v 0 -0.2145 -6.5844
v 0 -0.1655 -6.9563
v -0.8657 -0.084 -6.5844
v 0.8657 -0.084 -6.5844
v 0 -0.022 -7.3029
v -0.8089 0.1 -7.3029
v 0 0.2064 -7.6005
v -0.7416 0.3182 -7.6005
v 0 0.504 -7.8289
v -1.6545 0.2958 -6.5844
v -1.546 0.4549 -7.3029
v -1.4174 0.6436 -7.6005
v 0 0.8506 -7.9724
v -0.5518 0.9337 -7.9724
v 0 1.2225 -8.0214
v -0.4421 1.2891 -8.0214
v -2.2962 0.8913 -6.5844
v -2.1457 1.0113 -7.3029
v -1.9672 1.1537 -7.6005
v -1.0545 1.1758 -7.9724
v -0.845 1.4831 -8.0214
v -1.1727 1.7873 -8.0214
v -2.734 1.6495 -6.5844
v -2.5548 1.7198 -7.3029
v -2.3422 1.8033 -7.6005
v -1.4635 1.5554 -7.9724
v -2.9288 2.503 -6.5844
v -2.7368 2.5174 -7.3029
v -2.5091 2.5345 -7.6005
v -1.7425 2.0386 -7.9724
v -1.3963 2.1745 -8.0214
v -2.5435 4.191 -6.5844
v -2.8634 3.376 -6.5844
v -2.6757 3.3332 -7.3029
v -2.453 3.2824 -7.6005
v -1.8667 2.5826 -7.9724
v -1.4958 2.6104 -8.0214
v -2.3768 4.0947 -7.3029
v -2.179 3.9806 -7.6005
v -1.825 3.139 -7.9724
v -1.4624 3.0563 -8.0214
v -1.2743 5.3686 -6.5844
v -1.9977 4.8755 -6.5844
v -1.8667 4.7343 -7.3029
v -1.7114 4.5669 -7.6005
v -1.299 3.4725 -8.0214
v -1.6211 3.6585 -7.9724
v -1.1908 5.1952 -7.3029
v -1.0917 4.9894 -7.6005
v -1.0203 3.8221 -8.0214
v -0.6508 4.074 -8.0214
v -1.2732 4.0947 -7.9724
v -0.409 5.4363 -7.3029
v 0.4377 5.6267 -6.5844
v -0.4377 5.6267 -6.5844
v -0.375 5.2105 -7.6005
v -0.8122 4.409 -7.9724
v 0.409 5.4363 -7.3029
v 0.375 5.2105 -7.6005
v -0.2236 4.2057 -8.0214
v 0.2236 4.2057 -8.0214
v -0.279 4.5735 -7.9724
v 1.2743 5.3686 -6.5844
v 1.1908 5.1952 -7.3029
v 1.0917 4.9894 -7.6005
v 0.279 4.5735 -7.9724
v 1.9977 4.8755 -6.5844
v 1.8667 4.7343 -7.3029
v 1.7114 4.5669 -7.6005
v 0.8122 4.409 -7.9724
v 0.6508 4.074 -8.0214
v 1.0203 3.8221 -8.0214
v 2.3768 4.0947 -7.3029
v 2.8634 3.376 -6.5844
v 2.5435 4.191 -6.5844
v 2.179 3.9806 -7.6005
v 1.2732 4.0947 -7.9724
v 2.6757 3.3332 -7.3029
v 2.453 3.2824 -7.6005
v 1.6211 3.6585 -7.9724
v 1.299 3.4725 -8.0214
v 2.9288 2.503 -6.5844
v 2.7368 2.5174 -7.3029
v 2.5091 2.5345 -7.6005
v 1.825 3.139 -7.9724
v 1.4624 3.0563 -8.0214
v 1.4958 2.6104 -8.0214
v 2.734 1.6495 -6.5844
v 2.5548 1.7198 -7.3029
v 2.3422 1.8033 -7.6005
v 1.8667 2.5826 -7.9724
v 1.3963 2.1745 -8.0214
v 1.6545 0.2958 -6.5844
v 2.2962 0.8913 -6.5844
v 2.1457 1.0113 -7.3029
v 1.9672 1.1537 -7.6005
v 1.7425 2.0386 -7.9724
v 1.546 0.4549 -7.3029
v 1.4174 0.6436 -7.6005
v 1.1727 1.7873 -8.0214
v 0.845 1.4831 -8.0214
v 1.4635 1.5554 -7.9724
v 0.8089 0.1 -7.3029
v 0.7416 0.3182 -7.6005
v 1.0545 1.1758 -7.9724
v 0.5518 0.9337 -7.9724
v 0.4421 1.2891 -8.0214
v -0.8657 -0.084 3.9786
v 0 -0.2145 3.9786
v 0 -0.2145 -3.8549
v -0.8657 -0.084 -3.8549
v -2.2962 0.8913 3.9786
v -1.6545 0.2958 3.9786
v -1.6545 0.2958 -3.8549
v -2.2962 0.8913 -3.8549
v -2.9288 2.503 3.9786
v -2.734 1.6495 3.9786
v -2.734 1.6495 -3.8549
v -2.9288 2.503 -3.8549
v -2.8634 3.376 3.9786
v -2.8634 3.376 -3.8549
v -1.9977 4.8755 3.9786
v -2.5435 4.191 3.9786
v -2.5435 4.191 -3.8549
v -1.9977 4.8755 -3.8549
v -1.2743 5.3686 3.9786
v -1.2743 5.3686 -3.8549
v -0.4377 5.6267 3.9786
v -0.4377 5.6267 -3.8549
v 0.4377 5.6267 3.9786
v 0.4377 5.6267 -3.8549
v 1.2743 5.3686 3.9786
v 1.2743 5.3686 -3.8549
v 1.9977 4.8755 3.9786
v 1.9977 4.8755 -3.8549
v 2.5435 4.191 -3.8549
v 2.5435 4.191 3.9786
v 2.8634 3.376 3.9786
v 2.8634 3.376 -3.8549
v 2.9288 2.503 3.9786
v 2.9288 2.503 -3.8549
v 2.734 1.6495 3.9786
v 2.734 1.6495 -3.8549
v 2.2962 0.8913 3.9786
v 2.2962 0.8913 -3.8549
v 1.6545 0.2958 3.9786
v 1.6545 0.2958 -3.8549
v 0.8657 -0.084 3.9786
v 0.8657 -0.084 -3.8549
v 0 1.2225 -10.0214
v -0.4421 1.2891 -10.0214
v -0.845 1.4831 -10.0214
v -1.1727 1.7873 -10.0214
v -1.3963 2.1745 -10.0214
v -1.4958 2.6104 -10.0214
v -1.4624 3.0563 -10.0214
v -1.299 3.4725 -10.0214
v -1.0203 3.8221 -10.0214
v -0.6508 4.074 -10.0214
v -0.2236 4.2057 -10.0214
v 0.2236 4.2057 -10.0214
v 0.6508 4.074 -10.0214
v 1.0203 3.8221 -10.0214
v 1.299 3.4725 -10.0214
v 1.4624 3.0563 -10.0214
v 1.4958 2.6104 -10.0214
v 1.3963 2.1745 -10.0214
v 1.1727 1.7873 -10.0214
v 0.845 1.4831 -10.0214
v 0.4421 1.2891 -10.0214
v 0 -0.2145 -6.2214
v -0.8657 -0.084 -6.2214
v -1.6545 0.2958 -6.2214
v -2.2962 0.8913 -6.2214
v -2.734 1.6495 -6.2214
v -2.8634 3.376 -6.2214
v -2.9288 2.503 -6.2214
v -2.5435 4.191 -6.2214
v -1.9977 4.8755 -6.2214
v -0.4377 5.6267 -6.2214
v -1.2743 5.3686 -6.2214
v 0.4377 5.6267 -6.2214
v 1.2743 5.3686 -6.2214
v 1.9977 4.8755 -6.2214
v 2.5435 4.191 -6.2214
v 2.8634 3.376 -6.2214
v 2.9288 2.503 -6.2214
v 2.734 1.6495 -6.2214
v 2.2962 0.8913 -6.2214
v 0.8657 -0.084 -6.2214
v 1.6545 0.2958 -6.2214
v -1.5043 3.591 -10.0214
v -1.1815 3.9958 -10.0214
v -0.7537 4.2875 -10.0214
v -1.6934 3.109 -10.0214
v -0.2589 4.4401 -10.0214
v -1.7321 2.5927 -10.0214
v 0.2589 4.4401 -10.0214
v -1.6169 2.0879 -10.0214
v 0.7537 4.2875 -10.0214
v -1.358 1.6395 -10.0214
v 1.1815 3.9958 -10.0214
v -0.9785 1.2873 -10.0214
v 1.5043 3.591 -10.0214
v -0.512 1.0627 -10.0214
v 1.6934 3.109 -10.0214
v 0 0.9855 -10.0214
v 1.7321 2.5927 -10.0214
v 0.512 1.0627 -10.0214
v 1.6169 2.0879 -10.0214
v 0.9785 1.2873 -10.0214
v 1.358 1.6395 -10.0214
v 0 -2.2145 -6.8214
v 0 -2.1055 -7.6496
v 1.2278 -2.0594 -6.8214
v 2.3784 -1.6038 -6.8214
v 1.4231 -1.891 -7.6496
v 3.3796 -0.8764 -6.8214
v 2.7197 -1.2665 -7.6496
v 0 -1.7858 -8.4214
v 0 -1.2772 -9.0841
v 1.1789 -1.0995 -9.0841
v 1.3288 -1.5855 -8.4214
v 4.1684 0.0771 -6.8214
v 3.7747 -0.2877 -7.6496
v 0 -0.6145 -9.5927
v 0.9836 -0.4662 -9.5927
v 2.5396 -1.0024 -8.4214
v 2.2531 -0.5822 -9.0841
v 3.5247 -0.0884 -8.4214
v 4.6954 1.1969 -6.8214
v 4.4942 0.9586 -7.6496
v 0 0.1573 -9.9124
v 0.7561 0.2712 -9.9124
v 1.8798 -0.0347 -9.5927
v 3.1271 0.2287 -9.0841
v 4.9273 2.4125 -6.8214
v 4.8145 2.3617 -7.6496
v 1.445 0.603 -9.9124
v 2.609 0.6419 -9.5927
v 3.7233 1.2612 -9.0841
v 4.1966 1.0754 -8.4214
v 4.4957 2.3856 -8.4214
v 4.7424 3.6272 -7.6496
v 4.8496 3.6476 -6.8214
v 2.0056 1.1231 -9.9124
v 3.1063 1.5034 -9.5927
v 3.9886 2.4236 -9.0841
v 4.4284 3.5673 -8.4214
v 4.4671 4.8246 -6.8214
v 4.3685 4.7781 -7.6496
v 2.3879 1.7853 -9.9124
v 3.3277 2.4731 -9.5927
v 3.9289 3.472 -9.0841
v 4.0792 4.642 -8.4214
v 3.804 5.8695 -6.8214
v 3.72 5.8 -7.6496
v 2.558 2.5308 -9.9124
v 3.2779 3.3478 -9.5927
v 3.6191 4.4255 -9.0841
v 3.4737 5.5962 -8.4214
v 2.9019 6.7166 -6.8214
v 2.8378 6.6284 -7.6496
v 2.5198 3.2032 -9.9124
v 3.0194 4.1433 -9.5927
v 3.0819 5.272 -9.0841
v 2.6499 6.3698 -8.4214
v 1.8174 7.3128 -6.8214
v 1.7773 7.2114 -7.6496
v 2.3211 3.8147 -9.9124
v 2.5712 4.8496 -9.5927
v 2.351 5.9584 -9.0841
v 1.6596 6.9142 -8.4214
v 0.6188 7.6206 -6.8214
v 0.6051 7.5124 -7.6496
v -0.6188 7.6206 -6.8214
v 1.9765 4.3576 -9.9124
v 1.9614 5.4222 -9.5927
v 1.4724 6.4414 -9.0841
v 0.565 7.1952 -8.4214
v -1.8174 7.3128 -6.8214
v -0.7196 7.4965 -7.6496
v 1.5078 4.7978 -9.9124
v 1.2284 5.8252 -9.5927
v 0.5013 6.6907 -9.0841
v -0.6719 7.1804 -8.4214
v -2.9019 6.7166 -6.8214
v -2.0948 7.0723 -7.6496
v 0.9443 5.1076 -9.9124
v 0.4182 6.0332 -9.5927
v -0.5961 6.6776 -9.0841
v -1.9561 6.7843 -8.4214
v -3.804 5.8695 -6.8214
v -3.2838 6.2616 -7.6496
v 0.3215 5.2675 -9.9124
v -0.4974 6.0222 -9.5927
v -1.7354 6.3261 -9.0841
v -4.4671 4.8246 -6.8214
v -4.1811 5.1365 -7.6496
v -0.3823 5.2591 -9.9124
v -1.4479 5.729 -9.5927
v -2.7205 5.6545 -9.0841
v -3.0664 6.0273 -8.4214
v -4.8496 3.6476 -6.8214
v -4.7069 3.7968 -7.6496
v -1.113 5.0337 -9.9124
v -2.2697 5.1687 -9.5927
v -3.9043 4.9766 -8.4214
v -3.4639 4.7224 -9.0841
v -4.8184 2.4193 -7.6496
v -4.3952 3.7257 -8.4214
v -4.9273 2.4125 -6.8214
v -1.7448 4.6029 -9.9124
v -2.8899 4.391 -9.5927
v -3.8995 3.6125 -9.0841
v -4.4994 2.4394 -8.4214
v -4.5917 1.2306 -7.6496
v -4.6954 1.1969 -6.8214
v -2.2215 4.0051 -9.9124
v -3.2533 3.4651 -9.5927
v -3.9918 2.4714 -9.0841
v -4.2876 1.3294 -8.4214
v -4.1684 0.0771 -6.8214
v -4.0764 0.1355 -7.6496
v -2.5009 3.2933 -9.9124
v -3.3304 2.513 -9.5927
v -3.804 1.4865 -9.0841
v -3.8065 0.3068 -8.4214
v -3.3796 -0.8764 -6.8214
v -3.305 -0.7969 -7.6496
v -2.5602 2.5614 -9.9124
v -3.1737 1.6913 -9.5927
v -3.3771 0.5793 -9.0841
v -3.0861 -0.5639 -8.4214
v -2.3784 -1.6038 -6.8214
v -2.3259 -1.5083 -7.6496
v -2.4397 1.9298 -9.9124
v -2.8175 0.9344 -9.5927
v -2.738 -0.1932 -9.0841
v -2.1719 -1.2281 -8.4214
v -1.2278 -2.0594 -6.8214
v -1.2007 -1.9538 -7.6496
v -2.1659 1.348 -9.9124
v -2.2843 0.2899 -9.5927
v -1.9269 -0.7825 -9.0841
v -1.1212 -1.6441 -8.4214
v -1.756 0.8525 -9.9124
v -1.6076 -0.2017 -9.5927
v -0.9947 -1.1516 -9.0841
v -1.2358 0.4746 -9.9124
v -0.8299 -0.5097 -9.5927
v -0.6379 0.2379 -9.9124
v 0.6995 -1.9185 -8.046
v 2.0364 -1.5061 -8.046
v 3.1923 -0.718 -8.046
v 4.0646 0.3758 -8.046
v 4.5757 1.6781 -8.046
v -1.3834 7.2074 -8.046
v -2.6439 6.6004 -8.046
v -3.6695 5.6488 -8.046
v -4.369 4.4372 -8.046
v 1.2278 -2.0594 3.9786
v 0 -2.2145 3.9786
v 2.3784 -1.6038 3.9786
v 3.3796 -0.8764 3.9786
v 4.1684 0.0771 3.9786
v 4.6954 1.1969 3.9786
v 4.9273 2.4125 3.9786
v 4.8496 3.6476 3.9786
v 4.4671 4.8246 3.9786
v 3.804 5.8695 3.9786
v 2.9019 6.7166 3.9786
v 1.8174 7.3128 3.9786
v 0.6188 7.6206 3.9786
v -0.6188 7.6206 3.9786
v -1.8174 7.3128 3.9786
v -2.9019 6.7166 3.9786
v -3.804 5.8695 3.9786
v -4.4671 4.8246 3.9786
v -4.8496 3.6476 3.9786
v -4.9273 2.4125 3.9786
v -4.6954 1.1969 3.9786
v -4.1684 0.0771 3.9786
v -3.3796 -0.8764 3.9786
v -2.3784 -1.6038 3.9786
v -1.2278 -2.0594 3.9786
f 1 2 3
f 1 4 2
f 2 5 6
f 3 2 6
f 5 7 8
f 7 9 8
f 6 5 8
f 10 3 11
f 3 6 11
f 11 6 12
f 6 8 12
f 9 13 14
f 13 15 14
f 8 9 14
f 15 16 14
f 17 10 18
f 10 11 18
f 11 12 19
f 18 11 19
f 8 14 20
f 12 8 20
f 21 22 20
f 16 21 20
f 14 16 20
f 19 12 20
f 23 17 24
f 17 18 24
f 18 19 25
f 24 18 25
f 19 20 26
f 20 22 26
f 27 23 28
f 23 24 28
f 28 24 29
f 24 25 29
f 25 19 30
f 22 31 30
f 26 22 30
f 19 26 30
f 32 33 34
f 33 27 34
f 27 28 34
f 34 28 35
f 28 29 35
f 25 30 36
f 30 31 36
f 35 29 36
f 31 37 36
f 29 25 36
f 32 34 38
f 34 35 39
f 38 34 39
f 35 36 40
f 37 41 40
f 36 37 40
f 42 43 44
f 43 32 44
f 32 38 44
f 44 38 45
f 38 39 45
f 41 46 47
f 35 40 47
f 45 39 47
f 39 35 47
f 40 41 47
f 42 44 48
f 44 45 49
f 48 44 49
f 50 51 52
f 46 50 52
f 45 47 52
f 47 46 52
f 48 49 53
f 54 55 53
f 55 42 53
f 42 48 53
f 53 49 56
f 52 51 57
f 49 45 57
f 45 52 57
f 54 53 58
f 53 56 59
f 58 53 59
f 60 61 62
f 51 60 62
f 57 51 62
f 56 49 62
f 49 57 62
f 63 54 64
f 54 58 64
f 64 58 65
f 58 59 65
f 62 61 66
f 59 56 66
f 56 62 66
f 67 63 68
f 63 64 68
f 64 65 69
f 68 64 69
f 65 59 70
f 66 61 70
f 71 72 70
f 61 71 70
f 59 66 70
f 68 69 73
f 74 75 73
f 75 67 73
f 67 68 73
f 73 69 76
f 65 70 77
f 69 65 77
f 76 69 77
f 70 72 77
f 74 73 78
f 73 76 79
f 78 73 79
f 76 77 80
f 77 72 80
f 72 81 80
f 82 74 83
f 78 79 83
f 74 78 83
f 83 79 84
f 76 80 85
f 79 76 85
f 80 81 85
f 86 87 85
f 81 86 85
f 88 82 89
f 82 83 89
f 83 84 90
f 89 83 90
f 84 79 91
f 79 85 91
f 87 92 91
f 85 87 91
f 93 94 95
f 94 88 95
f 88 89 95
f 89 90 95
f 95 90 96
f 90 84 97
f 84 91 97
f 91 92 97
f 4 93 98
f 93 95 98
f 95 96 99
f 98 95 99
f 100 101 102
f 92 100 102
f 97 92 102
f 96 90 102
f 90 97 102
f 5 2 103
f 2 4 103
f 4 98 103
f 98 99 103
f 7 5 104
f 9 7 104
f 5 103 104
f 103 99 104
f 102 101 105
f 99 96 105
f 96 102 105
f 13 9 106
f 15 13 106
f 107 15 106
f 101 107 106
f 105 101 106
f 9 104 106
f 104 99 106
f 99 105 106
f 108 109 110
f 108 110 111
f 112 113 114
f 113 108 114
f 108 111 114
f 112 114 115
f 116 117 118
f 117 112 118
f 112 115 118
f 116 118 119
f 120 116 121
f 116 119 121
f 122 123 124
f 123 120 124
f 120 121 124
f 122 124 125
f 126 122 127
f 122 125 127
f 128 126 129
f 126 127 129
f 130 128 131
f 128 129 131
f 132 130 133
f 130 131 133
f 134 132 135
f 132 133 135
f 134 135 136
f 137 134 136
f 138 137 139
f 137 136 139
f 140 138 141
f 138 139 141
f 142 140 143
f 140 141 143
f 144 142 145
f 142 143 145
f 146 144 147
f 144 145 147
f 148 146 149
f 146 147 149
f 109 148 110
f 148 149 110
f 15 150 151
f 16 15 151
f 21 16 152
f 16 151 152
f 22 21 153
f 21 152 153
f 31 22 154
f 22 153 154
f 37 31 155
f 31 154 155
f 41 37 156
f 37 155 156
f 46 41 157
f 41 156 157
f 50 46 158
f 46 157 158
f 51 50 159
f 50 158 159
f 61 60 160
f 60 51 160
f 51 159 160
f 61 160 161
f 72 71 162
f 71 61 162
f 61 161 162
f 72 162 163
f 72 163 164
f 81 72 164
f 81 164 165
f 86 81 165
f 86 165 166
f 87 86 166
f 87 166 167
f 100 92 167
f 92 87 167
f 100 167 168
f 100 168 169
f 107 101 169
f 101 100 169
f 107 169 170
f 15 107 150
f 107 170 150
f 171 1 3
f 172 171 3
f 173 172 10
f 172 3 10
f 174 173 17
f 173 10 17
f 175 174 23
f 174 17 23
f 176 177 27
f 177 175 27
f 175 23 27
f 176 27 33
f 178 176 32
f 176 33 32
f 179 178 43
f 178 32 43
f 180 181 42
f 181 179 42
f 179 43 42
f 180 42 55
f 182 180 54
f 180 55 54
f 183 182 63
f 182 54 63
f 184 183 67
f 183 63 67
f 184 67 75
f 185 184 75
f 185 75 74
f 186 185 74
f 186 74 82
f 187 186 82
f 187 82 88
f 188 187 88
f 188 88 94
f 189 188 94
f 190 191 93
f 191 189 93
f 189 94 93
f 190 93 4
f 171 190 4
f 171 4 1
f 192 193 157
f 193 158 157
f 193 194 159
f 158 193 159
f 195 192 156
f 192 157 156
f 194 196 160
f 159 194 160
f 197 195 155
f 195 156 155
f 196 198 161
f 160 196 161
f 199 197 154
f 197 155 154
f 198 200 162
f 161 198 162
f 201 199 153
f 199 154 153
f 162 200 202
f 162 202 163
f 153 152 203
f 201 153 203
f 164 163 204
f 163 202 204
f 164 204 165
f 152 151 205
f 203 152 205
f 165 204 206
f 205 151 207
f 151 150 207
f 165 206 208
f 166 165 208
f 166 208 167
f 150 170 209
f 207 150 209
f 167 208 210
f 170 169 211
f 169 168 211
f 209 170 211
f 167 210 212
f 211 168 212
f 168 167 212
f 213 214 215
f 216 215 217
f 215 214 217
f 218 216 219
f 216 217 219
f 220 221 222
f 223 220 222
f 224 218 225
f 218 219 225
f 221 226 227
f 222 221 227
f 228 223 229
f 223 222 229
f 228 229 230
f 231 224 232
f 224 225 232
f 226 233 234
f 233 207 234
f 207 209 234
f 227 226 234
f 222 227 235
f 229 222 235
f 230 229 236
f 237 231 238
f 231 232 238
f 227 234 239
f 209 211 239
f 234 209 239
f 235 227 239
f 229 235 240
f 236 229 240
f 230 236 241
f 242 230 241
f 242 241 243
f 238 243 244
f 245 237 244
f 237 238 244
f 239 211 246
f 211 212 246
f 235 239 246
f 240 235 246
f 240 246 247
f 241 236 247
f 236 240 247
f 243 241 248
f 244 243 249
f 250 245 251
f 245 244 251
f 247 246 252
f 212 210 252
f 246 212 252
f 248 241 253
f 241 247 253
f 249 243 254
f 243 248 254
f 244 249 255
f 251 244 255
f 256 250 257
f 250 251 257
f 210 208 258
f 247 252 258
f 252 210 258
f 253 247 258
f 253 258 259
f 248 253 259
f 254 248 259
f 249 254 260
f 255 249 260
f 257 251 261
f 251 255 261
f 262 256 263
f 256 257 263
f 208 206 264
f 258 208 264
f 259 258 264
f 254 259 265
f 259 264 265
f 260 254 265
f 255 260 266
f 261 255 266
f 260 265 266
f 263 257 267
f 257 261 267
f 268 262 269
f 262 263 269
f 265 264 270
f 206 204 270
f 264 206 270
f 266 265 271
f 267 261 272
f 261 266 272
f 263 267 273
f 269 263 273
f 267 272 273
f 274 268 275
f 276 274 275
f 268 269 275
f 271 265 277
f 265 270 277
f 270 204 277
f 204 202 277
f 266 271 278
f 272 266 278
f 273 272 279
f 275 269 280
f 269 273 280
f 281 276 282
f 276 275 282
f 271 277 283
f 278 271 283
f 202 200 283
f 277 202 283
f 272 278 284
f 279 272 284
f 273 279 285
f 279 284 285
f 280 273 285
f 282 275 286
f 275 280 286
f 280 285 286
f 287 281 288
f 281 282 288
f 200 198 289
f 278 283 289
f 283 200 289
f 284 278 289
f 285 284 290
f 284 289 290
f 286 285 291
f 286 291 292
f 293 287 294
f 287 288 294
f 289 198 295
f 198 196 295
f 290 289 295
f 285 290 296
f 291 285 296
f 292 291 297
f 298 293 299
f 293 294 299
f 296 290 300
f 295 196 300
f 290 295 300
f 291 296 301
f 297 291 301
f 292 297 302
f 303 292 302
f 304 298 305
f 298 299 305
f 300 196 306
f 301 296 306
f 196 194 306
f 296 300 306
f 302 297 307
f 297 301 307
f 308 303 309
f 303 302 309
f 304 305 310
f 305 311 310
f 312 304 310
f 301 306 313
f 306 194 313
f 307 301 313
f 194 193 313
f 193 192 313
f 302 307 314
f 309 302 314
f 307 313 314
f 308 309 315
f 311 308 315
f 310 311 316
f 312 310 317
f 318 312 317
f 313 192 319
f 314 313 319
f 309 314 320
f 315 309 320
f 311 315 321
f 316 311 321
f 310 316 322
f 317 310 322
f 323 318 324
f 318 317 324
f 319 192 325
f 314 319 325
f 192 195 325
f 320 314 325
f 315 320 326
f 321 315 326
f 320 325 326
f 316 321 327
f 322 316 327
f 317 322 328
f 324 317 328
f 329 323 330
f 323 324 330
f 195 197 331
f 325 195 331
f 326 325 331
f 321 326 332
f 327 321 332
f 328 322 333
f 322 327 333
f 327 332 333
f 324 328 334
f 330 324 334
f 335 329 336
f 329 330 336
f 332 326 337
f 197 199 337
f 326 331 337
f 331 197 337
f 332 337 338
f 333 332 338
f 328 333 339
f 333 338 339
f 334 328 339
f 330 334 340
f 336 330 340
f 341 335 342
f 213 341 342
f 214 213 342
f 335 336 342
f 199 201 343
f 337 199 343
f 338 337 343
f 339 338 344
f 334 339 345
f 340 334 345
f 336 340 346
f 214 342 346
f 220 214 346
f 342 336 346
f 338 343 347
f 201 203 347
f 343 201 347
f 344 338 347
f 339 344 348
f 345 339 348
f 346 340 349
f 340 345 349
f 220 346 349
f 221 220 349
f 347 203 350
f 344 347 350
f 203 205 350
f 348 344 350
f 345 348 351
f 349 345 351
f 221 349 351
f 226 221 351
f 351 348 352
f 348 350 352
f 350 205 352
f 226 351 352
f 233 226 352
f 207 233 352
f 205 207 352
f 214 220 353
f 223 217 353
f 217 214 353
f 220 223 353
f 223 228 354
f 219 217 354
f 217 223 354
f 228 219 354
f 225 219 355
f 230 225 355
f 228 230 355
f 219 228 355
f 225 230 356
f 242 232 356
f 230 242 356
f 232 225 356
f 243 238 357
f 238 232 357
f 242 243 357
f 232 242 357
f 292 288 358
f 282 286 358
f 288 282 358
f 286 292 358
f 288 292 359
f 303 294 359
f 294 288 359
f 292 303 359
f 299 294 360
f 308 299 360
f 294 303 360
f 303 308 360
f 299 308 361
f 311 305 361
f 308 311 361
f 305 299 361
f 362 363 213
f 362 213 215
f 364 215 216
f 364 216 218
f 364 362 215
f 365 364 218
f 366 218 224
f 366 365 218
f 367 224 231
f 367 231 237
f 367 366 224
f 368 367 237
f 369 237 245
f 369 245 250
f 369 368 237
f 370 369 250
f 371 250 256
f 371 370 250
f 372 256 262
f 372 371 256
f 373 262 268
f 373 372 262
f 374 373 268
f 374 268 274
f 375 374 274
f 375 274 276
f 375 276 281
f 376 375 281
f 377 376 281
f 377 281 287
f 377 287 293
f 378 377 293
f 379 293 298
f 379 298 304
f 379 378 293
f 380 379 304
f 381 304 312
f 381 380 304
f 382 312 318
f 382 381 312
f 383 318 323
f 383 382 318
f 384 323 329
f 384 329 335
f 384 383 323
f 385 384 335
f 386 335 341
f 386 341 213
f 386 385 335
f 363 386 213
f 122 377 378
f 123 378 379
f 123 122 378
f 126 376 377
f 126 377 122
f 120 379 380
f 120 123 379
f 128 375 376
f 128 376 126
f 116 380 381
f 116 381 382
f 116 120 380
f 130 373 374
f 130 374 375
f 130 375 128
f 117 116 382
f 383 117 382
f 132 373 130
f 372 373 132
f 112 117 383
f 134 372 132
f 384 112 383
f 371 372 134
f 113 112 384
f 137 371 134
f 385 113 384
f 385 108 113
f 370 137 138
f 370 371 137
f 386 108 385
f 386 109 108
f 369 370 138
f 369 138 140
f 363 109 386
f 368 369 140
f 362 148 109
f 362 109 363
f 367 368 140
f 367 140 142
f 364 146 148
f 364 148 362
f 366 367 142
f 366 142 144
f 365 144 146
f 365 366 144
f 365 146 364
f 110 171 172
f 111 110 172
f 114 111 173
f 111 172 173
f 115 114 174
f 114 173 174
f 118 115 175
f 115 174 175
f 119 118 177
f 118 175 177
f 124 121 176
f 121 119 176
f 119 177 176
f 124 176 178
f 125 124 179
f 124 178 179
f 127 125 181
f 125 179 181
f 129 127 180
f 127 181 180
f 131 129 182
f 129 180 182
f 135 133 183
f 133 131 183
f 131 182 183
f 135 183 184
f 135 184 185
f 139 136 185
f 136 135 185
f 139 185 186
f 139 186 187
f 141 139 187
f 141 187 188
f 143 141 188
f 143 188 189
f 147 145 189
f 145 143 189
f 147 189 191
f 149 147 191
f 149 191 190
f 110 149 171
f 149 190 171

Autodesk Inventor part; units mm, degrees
ref_plane "YZ Plane" through (0, 0, 0) normal (1, 0, 0) x (0, 1, 0)
ref_plane "XZ Plane" through (0, 0, 0) normal (0, 1, 0) x (-1, 0, 0)
ref_plane "XY Plane" through (0, 0, 0) normal (0, 0, 1) x (1, 0, 0)
sketch "Эскиз1" plane through (0, 0, 0) normal (1, 0, 0) x (0, 1, 0)
  line L0 (-2.2145, -6.8214) -> (-2.2145, 3.9786)
  arc A0 (-2.2145, -6.8214) -> (0.9855, -10.0214) centre (0.9855, -6.8214) ccw
  line L1 (2.7225, -8.0214) -> (2.7225, 3.9786)
  line L2 (-0.2145, 3.9786) -> (-0.2145, -3.8549)
  line L3 (-0.2145, -3.8549) -> (-0.2145, -6.2214)
  line L4 (-0.2145, -6.2214) -> (-0.2145, -6.5844)
  line L5 (1.5855, -8.0214) -> (1.2225, -8.0214)
  arc A1 (-0.2145, -6.5844) -> (1.2225, -8.0214) centre (1.2225, -6.5844) ccw
  line L6 (2.7225, -8.0214) -> (2.7225, 3.9786)
  line L7 (1.2225, -8.0214) -> (1.2225, -10.0214)
  line L8 (1.2225, -10.0214) -> (0.9855, -10.0214)
  line L9 (-0.2145, 3.9786) -> (-2.2145, 3.9786)
  point P0 (1.2855, -8.0214)
  dimension "d1" = 3.2
  dimension "d3" = 14
  dimension "d9" = 2
  dimension "d14" = 1.437
  dimension "d16" = 1.5
sketch "Эскиз2" plane through (0, 0, 0) normal (1, 0, 0) x (0, 1, 0)
  point P0 (0, 0)
sketch "Эскиз3" plane through (0, 0, 0) normal (1, 0, 0) x (0, 1, 0)
  point P0 (0, 0)
sketch "Эскиз4" plane through (0, 0, 0) normal (1, 0, 0) x (0, 1, 0)
  point P0 (0, 0)
revolve "Вращение1" add sketch "Эскиз1" angle 360 about axis through (0, 2.7225, -8.0214) along (0, 0, 1)
properties part number "Задание номер 12"
